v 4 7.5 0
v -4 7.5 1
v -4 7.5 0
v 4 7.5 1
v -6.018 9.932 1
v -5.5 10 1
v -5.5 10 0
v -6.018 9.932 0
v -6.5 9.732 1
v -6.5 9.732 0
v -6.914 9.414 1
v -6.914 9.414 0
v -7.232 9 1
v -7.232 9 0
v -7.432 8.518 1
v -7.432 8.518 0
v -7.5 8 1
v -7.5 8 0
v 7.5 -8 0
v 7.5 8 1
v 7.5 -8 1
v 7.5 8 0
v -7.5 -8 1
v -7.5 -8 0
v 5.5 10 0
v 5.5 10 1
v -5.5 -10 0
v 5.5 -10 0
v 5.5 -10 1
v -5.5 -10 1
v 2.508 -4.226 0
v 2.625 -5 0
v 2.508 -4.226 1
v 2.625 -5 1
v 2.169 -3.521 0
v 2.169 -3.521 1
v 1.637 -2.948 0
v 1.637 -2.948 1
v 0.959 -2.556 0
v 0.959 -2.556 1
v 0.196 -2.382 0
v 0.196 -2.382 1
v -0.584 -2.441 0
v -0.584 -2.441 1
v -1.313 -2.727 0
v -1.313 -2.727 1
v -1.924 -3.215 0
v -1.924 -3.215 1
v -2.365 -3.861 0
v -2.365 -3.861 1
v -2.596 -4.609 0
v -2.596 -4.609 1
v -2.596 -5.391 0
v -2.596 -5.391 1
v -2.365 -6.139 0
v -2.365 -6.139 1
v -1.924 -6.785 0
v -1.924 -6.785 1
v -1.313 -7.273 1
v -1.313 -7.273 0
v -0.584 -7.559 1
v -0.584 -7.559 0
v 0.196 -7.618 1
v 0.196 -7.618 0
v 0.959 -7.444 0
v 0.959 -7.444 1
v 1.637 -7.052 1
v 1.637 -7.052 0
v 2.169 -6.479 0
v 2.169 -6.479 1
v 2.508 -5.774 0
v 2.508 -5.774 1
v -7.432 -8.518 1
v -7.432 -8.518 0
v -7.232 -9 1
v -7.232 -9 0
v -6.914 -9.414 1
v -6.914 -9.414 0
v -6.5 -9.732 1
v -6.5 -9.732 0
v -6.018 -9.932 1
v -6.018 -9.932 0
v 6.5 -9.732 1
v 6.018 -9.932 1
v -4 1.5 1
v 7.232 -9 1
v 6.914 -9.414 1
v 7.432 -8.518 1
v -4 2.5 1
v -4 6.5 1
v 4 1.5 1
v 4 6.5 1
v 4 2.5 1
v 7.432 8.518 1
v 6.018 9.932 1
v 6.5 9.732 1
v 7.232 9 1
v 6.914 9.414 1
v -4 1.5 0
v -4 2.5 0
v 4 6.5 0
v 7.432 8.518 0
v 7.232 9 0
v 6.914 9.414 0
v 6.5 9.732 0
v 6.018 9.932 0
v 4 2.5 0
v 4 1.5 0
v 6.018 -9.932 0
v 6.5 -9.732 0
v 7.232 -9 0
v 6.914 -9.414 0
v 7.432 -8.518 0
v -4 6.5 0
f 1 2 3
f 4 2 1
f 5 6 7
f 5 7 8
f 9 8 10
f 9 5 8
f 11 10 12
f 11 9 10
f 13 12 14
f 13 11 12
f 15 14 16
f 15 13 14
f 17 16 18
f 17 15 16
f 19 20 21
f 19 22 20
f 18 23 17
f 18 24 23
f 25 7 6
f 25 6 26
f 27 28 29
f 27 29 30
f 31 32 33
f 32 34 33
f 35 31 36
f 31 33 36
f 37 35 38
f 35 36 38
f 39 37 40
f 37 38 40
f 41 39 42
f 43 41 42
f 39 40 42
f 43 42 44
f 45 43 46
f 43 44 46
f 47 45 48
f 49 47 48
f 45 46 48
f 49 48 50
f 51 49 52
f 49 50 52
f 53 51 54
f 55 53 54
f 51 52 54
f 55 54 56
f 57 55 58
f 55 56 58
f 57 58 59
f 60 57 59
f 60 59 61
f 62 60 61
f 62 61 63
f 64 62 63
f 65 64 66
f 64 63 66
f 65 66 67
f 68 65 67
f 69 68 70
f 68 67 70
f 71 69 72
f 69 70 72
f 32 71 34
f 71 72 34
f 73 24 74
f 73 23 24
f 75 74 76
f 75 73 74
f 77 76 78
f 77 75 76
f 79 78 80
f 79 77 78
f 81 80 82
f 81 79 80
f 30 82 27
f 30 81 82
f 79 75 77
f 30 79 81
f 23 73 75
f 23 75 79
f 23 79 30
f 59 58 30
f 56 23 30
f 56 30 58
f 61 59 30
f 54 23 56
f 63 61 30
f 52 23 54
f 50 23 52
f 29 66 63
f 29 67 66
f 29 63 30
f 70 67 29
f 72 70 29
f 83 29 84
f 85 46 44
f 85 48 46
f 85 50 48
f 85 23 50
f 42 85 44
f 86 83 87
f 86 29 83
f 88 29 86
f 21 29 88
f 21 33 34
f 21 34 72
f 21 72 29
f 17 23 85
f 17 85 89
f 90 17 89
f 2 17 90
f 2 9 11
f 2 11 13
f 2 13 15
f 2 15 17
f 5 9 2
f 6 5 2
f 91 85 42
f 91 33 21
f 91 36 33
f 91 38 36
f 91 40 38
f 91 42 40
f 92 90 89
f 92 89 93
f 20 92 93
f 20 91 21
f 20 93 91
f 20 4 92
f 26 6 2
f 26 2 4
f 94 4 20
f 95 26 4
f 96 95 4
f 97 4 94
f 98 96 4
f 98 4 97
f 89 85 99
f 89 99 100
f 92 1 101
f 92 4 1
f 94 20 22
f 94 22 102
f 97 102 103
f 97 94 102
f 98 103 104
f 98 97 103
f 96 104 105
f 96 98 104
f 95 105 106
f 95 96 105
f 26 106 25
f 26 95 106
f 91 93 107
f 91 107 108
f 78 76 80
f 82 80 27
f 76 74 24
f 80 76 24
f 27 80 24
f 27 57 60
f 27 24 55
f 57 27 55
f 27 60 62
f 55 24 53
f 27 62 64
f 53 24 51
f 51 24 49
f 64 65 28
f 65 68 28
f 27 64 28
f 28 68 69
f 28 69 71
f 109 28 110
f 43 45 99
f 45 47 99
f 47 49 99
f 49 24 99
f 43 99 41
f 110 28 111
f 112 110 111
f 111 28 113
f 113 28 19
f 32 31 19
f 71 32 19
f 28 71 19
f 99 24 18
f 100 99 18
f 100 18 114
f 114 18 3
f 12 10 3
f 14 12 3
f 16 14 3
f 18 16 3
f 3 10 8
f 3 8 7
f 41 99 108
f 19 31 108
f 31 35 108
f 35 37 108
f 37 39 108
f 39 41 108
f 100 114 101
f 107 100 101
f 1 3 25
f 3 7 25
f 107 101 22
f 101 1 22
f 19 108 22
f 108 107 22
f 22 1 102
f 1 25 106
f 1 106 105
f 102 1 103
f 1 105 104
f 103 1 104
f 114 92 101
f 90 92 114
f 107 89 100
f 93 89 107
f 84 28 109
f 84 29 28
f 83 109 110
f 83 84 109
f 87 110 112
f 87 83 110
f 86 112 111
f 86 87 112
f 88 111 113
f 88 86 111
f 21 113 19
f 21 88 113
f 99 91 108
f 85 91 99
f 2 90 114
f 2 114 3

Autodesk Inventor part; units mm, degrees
ref_plane "YZ Plane" through (0, 0, 0) normal (1, 0, 0) x (0, 1, 0)
ref_plane "XZ Plane" through (0, 0, 0) normal (0, 1, 0) x (-1, 0, 0)
ref_plane "XY Plane" through (0, 0, 0) normal (0, 0, 1) x (1, 0, 0)
sketch "Sketch1" plane through (0, 0, 0) normal (0, 0, 1) x (1, 0, 0)
  line L0 (-7.5, 10) -> (7.5, 10)
  line L1 (7.5, 10) -> (7.5, -10)
  line L2 (7.5, -10) -> (-7.5, -10)
  line L3 (-7.5, -10) -> (-7.5, 10)
  point P0 (0, 0)
  dimension "d0" = 15
  dimension "d1" = 20
  dimension "d2" = 7.5
  dimension "d3" = 10
extrude "Extrusion1" add sketch "Sketch1" along normal blind 1
fillet "Fillet1" radius 2 4 edges at (7.5, 10, 0.5) (-7.5, 10, 0.5) (7.5, -10, 0.5) (-7.5, -10, 0.5)
sketch "Sketch2" plane through (0, 0, 1) normal (0, 0, 1) x (1, 0, 0)
  line L0 (-5.5, -10) -> (5.5, -10) projected
  line L1 (5.5, 10) -> (-5.5, 10) projected
  line L2 (-7.5, 8) -> (-7.5, -8) projected
  line L3 (-4, 7.5) -> (4, 7.5)
  line L4 (4, 7.5) -> (4, 6.5)
  line L5 (4, 6.5) -> (-4, 6.5)
  line L6 (-4, 6.5) -> (-4, 7.5)
  line L7 (-4, 2.5) -> (4, 2.5)
  line L8 (4, 2.5) -> (4, 1.5)
  line L9 (4, 1.5) -> (-4, 1.5)
  line L10 (-4, 1.5) -> (-4, 2.5)
  circle A0 centre (0, -5) radius 2.625
  point P0 (0, 0)
  dimension "d7" = 8
  dimension "d8" = 1
  dimension "d9" = 3.5
  dimension "d10" = 2.5
  dimension "d11" = 1
  dimension "d12" = 4
  dimension "d13" = 3.5
  dimension "d14" = 8
  dimension "d15" = 5.25
  dimension "d16" = 5
  dimension "d17" = 7.5
extrude "Extrusion2" cut sketch "Sketch2" against normal through all
equation "\"d2\" = 0.5 * d0"
equation "\"d3\" = 0.5 * d1"
properties part number "belt_clip" material "Nylon 6/6"
